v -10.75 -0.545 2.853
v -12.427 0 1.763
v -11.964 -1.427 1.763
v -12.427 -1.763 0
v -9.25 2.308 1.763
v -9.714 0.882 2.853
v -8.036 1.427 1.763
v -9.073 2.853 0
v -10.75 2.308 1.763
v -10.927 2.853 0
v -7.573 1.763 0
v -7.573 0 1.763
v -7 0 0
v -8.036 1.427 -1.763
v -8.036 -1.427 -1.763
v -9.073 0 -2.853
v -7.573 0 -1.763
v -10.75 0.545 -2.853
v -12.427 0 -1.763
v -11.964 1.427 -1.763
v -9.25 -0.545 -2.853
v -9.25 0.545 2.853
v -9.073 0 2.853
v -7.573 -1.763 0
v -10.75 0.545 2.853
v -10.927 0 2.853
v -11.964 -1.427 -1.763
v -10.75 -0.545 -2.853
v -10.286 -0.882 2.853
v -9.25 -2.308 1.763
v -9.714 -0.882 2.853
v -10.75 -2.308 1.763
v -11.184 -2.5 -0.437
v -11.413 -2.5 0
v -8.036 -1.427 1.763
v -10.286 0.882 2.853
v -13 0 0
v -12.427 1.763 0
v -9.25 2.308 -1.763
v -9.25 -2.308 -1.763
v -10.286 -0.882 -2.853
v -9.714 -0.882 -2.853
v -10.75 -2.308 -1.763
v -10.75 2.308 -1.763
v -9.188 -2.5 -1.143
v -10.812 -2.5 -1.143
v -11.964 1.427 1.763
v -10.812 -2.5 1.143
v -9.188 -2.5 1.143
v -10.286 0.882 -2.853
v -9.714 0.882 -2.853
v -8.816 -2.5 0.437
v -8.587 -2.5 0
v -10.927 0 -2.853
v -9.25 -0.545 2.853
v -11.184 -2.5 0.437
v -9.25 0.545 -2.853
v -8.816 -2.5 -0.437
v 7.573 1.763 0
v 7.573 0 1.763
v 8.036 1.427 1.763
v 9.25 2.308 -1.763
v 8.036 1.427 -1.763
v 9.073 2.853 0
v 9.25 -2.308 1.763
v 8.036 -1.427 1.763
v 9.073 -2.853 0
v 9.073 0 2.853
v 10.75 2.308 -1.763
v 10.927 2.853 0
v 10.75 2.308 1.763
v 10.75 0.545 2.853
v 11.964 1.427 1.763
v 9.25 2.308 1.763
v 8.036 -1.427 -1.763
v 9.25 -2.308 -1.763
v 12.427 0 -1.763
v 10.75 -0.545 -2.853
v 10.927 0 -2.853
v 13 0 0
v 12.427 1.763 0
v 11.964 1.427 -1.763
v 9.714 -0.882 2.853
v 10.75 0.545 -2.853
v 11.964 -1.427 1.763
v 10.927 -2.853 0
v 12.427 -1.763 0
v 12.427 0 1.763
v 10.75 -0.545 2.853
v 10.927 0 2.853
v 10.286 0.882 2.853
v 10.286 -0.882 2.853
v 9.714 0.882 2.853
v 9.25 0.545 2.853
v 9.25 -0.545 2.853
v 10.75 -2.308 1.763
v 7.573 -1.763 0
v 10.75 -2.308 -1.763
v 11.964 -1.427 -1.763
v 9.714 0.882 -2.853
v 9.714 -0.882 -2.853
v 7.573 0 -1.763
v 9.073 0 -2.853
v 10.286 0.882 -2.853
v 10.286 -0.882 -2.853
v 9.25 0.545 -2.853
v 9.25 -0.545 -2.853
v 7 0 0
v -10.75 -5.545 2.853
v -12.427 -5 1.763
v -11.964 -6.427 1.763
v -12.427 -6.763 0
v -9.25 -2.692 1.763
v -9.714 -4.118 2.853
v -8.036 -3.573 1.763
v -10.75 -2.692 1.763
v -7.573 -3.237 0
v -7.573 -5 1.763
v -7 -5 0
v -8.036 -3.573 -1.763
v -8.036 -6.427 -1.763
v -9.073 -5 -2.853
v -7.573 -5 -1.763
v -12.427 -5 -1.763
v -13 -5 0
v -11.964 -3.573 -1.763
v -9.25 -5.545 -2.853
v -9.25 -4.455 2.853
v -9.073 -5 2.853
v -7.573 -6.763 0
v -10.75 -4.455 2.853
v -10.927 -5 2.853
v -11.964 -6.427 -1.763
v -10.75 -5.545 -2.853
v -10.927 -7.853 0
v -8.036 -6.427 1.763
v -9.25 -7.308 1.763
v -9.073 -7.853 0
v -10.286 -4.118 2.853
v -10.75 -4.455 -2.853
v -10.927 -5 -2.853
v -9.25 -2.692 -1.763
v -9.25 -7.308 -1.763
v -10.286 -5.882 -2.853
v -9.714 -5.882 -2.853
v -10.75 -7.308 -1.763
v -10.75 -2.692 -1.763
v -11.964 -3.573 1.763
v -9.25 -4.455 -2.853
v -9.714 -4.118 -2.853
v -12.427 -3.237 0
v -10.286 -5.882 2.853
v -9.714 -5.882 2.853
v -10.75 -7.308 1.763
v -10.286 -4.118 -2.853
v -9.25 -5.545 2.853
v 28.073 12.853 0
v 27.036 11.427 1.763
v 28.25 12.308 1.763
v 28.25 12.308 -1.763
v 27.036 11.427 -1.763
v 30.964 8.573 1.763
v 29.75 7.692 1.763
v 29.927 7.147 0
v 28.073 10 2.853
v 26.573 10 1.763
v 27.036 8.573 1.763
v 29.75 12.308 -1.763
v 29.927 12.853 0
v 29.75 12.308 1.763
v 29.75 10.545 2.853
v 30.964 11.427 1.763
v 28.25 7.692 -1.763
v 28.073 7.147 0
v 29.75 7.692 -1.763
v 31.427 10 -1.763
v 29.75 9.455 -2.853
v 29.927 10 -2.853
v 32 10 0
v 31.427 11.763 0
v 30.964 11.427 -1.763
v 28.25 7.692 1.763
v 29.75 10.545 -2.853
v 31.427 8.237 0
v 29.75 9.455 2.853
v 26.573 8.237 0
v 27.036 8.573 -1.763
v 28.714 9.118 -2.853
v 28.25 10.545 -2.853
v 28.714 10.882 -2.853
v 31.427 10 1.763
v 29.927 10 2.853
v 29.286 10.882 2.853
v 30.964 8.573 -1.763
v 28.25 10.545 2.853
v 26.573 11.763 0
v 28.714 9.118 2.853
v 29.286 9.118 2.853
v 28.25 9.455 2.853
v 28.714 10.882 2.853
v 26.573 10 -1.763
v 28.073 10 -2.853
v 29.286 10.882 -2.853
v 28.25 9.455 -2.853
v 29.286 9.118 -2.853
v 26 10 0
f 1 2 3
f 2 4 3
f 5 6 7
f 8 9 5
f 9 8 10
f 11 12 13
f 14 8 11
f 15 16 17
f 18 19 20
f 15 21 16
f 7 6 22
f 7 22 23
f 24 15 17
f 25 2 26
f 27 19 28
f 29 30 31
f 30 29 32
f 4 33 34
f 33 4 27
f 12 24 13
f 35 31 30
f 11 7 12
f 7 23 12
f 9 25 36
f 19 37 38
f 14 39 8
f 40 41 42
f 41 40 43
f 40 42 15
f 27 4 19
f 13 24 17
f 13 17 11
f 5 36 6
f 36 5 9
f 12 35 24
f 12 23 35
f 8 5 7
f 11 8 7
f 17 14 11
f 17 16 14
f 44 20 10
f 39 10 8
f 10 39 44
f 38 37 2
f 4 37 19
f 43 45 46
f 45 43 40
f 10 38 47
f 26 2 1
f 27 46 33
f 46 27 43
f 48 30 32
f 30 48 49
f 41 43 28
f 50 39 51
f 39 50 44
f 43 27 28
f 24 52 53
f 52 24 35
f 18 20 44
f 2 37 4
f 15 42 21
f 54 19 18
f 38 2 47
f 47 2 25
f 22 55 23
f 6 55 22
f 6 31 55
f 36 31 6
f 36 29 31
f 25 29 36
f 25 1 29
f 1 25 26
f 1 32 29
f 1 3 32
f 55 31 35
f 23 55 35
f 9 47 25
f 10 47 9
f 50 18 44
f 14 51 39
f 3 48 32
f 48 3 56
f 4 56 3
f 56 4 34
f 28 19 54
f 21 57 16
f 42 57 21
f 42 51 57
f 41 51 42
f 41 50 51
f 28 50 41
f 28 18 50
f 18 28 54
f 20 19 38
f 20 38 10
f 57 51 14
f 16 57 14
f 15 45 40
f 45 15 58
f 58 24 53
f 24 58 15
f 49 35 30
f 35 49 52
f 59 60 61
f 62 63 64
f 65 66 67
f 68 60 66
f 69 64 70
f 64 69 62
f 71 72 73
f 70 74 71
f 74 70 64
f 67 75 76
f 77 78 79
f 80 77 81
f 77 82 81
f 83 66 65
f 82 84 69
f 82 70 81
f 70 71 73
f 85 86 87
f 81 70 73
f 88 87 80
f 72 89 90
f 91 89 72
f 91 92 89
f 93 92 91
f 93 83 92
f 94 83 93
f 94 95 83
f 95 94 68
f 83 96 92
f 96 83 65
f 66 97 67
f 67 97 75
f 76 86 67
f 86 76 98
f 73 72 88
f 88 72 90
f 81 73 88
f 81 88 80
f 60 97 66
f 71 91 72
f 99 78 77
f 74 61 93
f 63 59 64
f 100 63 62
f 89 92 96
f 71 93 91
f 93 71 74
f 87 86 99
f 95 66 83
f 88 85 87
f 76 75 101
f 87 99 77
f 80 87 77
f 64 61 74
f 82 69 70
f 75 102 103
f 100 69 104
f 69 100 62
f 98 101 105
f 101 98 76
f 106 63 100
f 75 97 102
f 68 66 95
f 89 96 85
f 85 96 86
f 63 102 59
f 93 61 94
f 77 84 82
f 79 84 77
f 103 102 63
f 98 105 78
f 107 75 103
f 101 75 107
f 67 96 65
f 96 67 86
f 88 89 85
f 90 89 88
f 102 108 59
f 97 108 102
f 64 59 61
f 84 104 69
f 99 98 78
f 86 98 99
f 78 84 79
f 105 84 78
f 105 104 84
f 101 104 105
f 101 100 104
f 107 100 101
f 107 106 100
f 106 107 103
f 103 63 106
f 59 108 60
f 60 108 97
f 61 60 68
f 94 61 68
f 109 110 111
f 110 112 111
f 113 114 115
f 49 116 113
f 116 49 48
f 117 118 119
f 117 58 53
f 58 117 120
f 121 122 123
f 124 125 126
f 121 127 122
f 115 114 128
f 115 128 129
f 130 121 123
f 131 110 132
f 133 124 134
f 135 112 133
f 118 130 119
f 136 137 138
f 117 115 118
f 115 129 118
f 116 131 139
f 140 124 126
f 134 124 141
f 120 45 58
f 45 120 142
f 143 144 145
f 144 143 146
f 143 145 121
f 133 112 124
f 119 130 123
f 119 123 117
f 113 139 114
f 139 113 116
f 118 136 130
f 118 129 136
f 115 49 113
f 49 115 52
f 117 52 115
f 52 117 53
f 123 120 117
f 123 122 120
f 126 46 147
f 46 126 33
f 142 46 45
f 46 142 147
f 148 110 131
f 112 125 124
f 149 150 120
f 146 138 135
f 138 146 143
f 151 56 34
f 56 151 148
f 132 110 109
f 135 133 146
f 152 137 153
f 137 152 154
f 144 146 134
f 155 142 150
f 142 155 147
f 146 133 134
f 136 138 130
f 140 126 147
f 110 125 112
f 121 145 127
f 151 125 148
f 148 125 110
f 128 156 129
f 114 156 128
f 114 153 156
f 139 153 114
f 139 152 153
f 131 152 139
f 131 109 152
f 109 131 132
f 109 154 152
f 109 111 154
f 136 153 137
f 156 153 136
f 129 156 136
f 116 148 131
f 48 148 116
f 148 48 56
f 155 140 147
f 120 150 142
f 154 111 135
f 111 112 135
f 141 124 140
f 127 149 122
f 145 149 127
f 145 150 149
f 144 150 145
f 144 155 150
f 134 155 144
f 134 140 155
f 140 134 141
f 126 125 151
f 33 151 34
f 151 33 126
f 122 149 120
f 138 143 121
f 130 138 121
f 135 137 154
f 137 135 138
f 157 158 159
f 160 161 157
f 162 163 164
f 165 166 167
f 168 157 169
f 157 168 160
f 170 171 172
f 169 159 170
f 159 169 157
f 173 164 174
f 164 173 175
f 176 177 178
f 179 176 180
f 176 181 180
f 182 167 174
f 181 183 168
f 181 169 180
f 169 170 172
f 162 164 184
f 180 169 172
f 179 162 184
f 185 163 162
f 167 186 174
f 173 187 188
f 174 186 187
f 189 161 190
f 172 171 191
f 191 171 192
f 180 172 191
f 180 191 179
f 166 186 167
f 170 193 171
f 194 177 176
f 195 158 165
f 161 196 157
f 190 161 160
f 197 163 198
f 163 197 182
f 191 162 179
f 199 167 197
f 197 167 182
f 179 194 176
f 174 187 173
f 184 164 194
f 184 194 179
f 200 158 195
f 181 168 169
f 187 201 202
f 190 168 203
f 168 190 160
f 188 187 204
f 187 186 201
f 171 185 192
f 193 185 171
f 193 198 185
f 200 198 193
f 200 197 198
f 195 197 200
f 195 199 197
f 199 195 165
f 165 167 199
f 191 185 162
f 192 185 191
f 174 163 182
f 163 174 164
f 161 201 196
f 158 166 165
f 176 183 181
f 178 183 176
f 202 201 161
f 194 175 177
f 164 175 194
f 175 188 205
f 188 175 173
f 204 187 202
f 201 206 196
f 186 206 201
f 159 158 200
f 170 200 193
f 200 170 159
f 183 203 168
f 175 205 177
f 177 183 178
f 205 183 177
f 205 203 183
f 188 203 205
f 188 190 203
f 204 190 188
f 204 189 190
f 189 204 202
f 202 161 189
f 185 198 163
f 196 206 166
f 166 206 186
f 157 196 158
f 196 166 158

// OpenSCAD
//Segement intersection 


line_a=[[-10,0],[10,0]];

line_b=[[-10,-5],[29,10]];

function dot(v1,v2)=
    v1.x*v2.x+v1.y*v2.y;
    
function cross_(v1,v2)=
    v1.x*v2.y-v1.y*v2.x;

function seg_inters_compare(line_a,line_b)=

    cross_(line_b[1]-line_b[0],line_a[1]-line_b[0])>=0 &&
    cross_(line_b[1]-line_b[0],line_a[0]-line_b[0])<=0 ||
    
    cross_(line_b[1]-line_b[0],line_a[1]-line_b[0])<=0 &&
    cross_(line_b[1]-line_b[0],line_a[0]-line_b[0])>=0 ?

     
    (cross_(line_a[0]-line_b[1],line_a[1]-line_b[1])>0 &&
    cross_(line_a[0]-line_b[0],line_a[1]-line_b[0])<0) ||

    (cross_(line_a[0]-line_b[1],line_a[1]-line_b[1])<0 &&
    cross_(line_a[0]-line_b[0],line_a[1]-line_b[0])>0)?
    
    
    
    true:
       
    false:false;
    
    
echo(seg_inters_compare(line_a,line_b));    
    
for(i=concat(line_a,line_b))
    translate(i)        
        sphere(3);
